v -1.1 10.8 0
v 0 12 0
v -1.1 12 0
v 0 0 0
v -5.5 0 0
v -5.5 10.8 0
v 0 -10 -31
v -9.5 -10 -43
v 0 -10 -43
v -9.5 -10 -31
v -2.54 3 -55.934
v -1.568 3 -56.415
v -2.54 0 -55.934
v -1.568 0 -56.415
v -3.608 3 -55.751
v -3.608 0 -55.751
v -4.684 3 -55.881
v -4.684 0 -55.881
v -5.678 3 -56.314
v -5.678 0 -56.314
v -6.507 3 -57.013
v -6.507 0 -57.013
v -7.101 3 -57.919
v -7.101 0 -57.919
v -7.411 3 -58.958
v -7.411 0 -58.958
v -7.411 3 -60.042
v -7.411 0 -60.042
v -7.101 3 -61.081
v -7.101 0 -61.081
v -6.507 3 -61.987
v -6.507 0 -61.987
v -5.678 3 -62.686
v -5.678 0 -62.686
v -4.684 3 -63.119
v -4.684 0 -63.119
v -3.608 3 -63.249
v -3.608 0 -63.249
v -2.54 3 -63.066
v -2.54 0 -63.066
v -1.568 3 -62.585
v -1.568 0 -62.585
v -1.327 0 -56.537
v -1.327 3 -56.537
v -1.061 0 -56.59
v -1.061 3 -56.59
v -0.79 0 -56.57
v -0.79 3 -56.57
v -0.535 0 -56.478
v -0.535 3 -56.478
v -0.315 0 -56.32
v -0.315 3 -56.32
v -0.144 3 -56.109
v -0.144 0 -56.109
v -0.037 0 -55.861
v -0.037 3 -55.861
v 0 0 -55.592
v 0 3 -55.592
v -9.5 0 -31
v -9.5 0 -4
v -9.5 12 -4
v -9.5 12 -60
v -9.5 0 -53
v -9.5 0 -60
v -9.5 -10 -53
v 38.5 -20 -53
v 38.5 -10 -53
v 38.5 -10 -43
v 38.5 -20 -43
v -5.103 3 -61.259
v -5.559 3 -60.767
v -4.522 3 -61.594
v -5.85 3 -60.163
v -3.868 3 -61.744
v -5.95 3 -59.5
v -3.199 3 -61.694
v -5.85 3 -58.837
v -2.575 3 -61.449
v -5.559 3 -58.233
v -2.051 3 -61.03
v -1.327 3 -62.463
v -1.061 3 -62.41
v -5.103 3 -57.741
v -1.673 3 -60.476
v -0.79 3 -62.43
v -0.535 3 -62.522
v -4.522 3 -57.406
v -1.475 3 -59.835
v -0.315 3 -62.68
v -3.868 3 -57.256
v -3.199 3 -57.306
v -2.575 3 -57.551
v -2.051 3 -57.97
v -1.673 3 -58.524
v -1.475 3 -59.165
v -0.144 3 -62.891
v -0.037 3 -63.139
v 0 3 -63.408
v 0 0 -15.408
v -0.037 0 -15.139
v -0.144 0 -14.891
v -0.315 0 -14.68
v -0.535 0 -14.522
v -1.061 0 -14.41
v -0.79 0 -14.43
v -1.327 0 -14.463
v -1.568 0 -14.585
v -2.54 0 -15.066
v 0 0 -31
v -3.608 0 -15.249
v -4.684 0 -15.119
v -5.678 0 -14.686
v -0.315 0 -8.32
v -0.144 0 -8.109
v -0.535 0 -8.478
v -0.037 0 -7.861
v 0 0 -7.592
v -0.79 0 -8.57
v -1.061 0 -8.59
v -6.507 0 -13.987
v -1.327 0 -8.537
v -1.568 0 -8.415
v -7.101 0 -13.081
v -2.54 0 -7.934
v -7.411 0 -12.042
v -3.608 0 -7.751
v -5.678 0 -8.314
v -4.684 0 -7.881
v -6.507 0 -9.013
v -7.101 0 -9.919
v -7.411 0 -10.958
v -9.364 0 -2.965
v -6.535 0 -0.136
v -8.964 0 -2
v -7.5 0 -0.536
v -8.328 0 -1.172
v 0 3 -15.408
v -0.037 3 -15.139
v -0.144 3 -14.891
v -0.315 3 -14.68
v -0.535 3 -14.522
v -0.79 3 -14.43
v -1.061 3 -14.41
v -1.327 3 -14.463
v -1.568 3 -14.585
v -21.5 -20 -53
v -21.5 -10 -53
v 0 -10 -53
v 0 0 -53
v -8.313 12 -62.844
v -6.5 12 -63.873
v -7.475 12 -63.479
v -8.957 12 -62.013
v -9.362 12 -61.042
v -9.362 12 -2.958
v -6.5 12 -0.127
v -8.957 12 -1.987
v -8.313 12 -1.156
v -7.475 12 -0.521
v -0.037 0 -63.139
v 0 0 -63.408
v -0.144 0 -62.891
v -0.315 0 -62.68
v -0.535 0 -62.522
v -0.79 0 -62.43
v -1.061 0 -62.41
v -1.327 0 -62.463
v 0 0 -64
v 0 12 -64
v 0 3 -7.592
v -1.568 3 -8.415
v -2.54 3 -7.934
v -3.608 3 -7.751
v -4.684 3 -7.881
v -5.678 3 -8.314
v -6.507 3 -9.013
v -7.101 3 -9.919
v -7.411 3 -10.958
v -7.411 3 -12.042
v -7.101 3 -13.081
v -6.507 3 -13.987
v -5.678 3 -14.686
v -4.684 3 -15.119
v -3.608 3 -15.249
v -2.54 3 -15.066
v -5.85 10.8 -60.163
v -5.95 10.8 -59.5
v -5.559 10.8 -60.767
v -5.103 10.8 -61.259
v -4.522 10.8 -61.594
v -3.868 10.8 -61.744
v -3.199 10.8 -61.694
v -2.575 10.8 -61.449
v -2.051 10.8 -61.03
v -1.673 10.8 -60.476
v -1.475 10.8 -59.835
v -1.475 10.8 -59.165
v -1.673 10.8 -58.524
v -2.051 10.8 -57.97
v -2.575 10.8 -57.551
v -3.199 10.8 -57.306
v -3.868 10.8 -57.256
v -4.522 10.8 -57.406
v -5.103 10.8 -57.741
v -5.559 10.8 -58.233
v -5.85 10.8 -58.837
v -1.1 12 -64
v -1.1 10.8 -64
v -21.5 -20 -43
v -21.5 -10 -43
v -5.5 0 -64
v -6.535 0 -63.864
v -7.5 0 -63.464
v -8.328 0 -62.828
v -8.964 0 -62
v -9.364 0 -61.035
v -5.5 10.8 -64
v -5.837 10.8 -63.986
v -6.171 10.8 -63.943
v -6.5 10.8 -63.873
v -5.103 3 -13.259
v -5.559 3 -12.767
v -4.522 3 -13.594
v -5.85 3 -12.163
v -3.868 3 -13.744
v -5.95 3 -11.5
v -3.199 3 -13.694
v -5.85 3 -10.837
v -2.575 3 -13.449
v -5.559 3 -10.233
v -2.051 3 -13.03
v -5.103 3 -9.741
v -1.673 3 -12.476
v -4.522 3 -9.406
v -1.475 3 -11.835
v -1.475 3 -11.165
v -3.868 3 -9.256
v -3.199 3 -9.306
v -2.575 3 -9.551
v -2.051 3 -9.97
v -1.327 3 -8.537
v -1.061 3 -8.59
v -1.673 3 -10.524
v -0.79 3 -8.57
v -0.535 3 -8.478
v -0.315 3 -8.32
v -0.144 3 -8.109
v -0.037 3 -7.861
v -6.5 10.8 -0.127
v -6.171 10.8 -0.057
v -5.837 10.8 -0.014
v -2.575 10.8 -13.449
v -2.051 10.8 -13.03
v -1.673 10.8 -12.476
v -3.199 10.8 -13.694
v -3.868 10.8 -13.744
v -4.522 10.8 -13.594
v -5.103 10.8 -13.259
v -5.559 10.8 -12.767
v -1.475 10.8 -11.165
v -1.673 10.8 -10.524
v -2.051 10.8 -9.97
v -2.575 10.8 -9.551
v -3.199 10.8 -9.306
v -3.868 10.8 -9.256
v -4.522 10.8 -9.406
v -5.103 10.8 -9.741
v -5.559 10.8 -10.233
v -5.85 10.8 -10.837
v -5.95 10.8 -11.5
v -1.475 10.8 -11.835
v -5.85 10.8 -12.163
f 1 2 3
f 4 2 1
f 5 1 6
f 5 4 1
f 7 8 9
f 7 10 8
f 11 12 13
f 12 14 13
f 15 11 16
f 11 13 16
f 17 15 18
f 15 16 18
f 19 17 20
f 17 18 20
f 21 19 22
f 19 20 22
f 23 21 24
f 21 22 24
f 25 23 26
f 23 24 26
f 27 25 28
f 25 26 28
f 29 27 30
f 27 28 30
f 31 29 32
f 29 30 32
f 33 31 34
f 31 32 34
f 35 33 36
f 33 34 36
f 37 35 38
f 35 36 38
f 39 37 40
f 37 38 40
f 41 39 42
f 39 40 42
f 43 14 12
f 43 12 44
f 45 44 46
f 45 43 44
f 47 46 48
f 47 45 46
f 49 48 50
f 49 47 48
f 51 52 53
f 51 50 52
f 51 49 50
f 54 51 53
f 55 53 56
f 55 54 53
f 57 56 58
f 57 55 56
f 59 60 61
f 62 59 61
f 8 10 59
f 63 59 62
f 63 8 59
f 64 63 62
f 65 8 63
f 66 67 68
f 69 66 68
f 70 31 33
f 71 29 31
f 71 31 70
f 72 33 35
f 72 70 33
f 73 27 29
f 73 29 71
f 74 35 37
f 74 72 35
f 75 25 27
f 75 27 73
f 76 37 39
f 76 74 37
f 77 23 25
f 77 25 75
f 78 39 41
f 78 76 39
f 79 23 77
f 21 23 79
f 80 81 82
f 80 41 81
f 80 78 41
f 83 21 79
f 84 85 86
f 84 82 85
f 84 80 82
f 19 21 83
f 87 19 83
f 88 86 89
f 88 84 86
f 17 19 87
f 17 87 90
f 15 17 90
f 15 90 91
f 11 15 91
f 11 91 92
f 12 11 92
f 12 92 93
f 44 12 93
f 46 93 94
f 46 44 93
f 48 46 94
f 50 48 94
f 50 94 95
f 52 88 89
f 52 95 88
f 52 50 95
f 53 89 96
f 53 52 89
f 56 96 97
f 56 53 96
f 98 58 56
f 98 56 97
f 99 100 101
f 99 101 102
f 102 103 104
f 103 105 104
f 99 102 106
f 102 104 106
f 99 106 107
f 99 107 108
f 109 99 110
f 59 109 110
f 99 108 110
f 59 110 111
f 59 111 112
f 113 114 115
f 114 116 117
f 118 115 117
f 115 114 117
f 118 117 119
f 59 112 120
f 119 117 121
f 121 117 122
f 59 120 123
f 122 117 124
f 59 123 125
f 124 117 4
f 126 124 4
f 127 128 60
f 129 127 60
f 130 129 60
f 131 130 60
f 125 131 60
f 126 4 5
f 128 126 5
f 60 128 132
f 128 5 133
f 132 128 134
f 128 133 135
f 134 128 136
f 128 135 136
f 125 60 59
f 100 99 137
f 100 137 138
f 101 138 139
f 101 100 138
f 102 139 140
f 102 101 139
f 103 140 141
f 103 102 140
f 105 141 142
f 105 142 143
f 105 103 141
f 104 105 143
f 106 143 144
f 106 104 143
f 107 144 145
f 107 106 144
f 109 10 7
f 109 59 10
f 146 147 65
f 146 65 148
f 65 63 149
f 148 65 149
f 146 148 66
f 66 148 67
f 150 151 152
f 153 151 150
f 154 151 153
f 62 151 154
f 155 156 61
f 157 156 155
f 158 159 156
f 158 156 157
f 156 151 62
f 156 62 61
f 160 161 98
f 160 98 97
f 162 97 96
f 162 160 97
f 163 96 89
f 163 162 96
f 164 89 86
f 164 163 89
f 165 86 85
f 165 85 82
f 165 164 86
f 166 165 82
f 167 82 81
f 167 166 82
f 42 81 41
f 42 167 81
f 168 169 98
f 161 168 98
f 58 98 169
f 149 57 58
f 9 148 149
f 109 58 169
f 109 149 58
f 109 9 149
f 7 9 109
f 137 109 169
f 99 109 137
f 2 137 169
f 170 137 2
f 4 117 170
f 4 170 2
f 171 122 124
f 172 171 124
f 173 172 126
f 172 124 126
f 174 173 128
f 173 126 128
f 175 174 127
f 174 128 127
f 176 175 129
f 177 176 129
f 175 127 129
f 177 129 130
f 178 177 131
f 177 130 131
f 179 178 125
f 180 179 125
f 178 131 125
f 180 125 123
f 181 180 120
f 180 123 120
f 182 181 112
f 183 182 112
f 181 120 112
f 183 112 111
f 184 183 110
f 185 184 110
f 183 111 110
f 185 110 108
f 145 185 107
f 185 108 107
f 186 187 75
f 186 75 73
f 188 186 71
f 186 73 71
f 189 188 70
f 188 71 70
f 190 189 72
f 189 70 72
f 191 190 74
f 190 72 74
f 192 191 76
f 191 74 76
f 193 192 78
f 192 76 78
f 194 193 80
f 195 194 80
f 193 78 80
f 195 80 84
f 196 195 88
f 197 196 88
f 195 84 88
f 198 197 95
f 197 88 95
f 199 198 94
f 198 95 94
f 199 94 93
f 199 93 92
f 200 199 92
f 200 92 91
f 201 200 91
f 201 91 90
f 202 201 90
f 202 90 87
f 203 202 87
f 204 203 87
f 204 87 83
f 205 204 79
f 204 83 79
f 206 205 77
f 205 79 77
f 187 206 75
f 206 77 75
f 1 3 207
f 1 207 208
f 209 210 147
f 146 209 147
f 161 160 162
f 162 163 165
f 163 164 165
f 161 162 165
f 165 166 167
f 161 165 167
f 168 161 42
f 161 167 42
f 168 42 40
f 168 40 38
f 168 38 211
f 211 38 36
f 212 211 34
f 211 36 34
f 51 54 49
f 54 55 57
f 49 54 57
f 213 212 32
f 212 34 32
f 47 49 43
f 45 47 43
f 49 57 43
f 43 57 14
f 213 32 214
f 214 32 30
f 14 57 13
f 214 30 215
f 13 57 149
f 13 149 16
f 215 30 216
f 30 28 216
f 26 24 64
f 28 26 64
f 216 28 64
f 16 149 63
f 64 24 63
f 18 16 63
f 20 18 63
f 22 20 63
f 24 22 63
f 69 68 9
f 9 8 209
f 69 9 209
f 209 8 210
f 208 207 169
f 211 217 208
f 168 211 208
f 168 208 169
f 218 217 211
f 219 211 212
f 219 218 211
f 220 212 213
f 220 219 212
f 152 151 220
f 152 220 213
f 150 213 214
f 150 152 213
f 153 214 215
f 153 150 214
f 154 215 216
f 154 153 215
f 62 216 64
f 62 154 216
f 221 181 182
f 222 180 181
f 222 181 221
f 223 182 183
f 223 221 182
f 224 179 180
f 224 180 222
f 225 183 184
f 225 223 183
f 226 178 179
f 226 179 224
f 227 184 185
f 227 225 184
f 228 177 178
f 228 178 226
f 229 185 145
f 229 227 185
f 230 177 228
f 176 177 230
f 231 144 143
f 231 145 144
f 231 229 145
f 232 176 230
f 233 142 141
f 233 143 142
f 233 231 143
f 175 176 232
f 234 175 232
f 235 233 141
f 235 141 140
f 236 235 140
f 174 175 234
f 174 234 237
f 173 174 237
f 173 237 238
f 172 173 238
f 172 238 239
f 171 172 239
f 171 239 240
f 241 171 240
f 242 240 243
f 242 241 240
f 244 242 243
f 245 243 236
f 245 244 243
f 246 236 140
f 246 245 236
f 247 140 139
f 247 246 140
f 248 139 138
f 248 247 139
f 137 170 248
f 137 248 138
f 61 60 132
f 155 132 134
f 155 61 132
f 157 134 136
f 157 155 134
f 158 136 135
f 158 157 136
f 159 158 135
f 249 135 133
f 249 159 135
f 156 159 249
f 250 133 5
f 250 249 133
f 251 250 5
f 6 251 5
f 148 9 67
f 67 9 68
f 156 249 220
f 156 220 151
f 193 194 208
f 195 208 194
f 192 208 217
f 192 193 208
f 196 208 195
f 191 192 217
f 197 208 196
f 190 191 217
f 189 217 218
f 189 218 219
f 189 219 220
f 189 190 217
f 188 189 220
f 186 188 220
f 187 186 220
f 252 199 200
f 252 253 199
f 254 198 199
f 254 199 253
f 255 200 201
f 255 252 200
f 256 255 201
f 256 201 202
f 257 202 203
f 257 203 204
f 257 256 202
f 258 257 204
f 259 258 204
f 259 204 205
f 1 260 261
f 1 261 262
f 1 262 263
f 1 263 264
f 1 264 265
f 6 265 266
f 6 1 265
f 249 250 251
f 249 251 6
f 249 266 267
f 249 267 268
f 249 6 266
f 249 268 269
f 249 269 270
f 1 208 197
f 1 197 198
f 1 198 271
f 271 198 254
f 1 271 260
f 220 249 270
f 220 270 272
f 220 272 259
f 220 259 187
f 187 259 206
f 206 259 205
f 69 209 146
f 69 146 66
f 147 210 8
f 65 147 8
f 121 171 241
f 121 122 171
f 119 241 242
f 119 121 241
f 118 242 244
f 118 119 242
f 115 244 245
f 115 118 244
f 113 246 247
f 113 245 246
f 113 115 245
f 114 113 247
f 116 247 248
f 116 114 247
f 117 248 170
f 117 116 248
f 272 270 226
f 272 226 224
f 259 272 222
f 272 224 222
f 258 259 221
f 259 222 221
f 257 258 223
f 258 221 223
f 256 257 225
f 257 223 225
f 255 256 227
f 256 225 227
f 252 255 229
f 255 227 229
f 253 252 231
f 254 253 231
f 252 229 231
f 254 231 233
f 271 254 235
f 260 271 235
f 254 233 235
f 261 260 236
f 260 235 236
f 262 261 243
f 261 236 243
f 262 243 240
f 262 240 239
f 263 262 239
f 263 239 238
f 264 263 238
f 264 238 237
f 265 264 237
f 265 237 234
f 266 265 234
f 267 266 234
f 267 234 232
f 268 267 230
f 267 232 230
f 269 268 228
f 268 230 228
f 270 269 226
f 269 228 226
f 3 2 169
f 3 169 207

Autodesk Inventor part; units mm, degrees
ref_plane "YZ Plane" through (0, 0, 0) normal (1, 0, 0) x (0, 1, 0)
ref_plane "XZ Plane" through (0, 0, 0) normal (0, 1, 0) x (-1, 0, 0)
ref_plane "XY Plane" through (0, 0, 0) normal (0, 0, 1) x (1, 0, 0)
sketch "Sketch1" plane through (0, 0, 0) normal (0, 1, 0) x (-1, 0, 0)
  line L0 (0, 0) -> (9.5, 0)
  line L1 (9.5, 0) -> (9.5, -64)
  line L2 (9.5, -64) -> (0, -64)
  line L3 (0, -64) -> (0, 0)
  circle A0 centre (3.7, -11.5) radius 2.25
  circle A1 centre (3.7, -59.5) radius 2.25
  line L4 (3.7, -11.5) -> (3.7, -59.5) construction
  dimension "d1" = 9.5
  dimension "d2" = 64
  dimension "d3" = 4.5
  dimension "d4" = 48
  dimension "d6" = 3.7
  dimension "d17" = 4.5
extrude "Extrusion1" add sketch "Sketch1" along normal blind 12
sketch "Sketch2" plane through (-9.5, 0, 0) normal (0, 0, 1) x (1, 0, 0)
  line L0 (9.5, 12) -> (0, 12) projected
  line L1 (3, 12) -> (8.4, 12)
  line L2 (8.4, 12) -> (8.4, 10.8)
  line L3 (8.4, 10.8) -> (3, 10.8)
  line L4 (3, 10.8) -> (3, 12)
  line L5 (9.5, 0) -> (9.5, 12) projected
  line L6 (3.55, 0) -> (8.05, 0) projected
  line L7 (3.55, 12) -> (8.05, 12) projected
  line L8 (9.5, 0) -> (9.5, 12) projected
  line L9 (9.5, 0) -> (9.5, 12) projected
  line L10 (3.55, 12) -> (8.05, 12) projected
  line L11 (3.55, 12) -> (3.55, 0) projected
  line L12 (3.55, 12) -> (8.05, 12) projected
  line L13 (3.55, 0) -> (8.05, 0) projected
  line L14 (3.55, 12) -> (8.05, 12) projected
  line L15 (3.55, 0) -> (8.05, 0) projected
  line L16 (3.55, 12) -> (8.05, 12) projected
  line L17 (3.55, 0) -> (8.05, 0) projected
  dimension "d9" = 1.1
  dimension "d10" = 5.4
  dimension "d11" = 1.2
  dimension "d76" = 12
extrude "Extrusion2" cut sketch "Sketch2" against normal up to next
sketch "Sketch3" plane through (0, 0, 0) normal (0, -1, 0) x (1, 0, 0)
  circle A0 centre (-3.7, -11.5) radius 2.25 projected
  circle A1 centre (-3.7, -11.5) radius 3.75
  circle A2 centre (-3.7, -59.5) radius 2.25 projected
  circle A3 centre (-3.7, -59.5) radius 3.75
  point P0 (0, 0)
  dimension "d14" = 7.5
extrude "Extrusion3" cut sketch "Sketch3" against normal blind 3
fillet "Fillet1" radius 1 4 edges at (0, 1.5, -58.8897) (0, 1.5, -60.1103) (0, 1.5, -10.8897) (0, 1.5, -12.1103)
fillet "Fillet2" radius 4 2 edges at (-9.5, 6, -64) (-9.5, 6, 0)
sketch "Sketch28" plane through (0, 0, 0) normal (0, -1, 0) x (1, 0, 0)
  arc A0 (-1.5684, -56.4147) -> (0, -55.592) centre (-1, -55.592) ccw projected
  line L0 (0, -55.592) -> (0, -53)
  line L1 (0, -15.408) -> (0, -55.592) projected
  line L2 (-9.5, -60) -> (-9.5, -4) projected
  line L3 (0, -53) -> (-9.5, -53)
  line L4 (-9.5, -53) -> (-9.5, -31)
  line L5 (-9.5, -31) -> (0, -31)
  line L6 (0, -31) -> (0, -53)
  point P0 (0, 0)
  point P1 (0, -31)
  dimension "d107" = 2.592
  dimension "d108" = 22
extrude "Extrusion19" add sketch "Sketch28" along normal blind 10
sketch "Sketch29" plane through (0, -10, 0) normal (0, -1, 0) x (1, 0, 0)
  line L0 (-9.5, -53) -> (0, -53) projected
  line L1 (-9.5, -53) -> (38.5, -53)
  line L2 (38.5, -53) -> (38.5, -43)
  line L3 (38.5, -43) -> (-21.5, -43)
  line L4 (-21.5, -43) -> (-21.5, -53)
  line L5 (-21.5, -53) -> (-9.5, -53)
  point P0 (0, 0)
  dimension "d111" = 48
  dimension "d112" = 10
  dimension "d113" = 60
  dimension "d114" = 10
extrude "Extrusion20" add sketch "Sketch29" along normal blind 10
sketch "Sketch32" plane through (0, -20, 0) normal (0, -1, 0) x (1, 0, 0)
  arc A0 (-21.5, -43) -> (38.5, -43) centre (8.5, 103.9694) ccw
  line L0 (-21.5, -43) -> (-21.5, -53) projected
  line L1 (-21.5, -43) -> (-21.5, -48)
  point P0 (0, 0)
  dimension "d121" = 60
  dimension "d122" = 150
sketch "Sketch34" plane through (0, -20, 0) normal (0, -1, 0) x (1, 0, 0)
  line L0 (-21.5, -43) -> (-21.5, -53) projected
  line L1 (38.5, -53) -> (38.5, -43) projected
  arc A0 (-21.5, -48) -> (38.5, -48) centre (8.5, 93.8626) ccw
  point P0 (0, 0)
  dimension "d123" = 145
sketch "Sketch36" plane through (0, -20, 0) normal (0, -1, 0) x (1, 0, 0)
  line L0 (-21.5, -43) -> (-21.5, -53) projected
  line L1 (-21.5, -48) -> (-21.5, -43)
  line L2 (38.5, -53) -> (38.5, -43) projected
  line L3 (38.5, -48) -> (38.5, -43)
  point P0 (0, 0)
sketch "Sketch37" plane through (-21.5, -10, -53) normal (-1, 0, 0) x (0, 0, 1)
  arc A0 (10, -10) -> (10, -60) centre (41.225, -35) ccw
  point P0 (53, 10)
  dimension "d126" = 50
  dimension "d127" = 40
properties part number "Back"
